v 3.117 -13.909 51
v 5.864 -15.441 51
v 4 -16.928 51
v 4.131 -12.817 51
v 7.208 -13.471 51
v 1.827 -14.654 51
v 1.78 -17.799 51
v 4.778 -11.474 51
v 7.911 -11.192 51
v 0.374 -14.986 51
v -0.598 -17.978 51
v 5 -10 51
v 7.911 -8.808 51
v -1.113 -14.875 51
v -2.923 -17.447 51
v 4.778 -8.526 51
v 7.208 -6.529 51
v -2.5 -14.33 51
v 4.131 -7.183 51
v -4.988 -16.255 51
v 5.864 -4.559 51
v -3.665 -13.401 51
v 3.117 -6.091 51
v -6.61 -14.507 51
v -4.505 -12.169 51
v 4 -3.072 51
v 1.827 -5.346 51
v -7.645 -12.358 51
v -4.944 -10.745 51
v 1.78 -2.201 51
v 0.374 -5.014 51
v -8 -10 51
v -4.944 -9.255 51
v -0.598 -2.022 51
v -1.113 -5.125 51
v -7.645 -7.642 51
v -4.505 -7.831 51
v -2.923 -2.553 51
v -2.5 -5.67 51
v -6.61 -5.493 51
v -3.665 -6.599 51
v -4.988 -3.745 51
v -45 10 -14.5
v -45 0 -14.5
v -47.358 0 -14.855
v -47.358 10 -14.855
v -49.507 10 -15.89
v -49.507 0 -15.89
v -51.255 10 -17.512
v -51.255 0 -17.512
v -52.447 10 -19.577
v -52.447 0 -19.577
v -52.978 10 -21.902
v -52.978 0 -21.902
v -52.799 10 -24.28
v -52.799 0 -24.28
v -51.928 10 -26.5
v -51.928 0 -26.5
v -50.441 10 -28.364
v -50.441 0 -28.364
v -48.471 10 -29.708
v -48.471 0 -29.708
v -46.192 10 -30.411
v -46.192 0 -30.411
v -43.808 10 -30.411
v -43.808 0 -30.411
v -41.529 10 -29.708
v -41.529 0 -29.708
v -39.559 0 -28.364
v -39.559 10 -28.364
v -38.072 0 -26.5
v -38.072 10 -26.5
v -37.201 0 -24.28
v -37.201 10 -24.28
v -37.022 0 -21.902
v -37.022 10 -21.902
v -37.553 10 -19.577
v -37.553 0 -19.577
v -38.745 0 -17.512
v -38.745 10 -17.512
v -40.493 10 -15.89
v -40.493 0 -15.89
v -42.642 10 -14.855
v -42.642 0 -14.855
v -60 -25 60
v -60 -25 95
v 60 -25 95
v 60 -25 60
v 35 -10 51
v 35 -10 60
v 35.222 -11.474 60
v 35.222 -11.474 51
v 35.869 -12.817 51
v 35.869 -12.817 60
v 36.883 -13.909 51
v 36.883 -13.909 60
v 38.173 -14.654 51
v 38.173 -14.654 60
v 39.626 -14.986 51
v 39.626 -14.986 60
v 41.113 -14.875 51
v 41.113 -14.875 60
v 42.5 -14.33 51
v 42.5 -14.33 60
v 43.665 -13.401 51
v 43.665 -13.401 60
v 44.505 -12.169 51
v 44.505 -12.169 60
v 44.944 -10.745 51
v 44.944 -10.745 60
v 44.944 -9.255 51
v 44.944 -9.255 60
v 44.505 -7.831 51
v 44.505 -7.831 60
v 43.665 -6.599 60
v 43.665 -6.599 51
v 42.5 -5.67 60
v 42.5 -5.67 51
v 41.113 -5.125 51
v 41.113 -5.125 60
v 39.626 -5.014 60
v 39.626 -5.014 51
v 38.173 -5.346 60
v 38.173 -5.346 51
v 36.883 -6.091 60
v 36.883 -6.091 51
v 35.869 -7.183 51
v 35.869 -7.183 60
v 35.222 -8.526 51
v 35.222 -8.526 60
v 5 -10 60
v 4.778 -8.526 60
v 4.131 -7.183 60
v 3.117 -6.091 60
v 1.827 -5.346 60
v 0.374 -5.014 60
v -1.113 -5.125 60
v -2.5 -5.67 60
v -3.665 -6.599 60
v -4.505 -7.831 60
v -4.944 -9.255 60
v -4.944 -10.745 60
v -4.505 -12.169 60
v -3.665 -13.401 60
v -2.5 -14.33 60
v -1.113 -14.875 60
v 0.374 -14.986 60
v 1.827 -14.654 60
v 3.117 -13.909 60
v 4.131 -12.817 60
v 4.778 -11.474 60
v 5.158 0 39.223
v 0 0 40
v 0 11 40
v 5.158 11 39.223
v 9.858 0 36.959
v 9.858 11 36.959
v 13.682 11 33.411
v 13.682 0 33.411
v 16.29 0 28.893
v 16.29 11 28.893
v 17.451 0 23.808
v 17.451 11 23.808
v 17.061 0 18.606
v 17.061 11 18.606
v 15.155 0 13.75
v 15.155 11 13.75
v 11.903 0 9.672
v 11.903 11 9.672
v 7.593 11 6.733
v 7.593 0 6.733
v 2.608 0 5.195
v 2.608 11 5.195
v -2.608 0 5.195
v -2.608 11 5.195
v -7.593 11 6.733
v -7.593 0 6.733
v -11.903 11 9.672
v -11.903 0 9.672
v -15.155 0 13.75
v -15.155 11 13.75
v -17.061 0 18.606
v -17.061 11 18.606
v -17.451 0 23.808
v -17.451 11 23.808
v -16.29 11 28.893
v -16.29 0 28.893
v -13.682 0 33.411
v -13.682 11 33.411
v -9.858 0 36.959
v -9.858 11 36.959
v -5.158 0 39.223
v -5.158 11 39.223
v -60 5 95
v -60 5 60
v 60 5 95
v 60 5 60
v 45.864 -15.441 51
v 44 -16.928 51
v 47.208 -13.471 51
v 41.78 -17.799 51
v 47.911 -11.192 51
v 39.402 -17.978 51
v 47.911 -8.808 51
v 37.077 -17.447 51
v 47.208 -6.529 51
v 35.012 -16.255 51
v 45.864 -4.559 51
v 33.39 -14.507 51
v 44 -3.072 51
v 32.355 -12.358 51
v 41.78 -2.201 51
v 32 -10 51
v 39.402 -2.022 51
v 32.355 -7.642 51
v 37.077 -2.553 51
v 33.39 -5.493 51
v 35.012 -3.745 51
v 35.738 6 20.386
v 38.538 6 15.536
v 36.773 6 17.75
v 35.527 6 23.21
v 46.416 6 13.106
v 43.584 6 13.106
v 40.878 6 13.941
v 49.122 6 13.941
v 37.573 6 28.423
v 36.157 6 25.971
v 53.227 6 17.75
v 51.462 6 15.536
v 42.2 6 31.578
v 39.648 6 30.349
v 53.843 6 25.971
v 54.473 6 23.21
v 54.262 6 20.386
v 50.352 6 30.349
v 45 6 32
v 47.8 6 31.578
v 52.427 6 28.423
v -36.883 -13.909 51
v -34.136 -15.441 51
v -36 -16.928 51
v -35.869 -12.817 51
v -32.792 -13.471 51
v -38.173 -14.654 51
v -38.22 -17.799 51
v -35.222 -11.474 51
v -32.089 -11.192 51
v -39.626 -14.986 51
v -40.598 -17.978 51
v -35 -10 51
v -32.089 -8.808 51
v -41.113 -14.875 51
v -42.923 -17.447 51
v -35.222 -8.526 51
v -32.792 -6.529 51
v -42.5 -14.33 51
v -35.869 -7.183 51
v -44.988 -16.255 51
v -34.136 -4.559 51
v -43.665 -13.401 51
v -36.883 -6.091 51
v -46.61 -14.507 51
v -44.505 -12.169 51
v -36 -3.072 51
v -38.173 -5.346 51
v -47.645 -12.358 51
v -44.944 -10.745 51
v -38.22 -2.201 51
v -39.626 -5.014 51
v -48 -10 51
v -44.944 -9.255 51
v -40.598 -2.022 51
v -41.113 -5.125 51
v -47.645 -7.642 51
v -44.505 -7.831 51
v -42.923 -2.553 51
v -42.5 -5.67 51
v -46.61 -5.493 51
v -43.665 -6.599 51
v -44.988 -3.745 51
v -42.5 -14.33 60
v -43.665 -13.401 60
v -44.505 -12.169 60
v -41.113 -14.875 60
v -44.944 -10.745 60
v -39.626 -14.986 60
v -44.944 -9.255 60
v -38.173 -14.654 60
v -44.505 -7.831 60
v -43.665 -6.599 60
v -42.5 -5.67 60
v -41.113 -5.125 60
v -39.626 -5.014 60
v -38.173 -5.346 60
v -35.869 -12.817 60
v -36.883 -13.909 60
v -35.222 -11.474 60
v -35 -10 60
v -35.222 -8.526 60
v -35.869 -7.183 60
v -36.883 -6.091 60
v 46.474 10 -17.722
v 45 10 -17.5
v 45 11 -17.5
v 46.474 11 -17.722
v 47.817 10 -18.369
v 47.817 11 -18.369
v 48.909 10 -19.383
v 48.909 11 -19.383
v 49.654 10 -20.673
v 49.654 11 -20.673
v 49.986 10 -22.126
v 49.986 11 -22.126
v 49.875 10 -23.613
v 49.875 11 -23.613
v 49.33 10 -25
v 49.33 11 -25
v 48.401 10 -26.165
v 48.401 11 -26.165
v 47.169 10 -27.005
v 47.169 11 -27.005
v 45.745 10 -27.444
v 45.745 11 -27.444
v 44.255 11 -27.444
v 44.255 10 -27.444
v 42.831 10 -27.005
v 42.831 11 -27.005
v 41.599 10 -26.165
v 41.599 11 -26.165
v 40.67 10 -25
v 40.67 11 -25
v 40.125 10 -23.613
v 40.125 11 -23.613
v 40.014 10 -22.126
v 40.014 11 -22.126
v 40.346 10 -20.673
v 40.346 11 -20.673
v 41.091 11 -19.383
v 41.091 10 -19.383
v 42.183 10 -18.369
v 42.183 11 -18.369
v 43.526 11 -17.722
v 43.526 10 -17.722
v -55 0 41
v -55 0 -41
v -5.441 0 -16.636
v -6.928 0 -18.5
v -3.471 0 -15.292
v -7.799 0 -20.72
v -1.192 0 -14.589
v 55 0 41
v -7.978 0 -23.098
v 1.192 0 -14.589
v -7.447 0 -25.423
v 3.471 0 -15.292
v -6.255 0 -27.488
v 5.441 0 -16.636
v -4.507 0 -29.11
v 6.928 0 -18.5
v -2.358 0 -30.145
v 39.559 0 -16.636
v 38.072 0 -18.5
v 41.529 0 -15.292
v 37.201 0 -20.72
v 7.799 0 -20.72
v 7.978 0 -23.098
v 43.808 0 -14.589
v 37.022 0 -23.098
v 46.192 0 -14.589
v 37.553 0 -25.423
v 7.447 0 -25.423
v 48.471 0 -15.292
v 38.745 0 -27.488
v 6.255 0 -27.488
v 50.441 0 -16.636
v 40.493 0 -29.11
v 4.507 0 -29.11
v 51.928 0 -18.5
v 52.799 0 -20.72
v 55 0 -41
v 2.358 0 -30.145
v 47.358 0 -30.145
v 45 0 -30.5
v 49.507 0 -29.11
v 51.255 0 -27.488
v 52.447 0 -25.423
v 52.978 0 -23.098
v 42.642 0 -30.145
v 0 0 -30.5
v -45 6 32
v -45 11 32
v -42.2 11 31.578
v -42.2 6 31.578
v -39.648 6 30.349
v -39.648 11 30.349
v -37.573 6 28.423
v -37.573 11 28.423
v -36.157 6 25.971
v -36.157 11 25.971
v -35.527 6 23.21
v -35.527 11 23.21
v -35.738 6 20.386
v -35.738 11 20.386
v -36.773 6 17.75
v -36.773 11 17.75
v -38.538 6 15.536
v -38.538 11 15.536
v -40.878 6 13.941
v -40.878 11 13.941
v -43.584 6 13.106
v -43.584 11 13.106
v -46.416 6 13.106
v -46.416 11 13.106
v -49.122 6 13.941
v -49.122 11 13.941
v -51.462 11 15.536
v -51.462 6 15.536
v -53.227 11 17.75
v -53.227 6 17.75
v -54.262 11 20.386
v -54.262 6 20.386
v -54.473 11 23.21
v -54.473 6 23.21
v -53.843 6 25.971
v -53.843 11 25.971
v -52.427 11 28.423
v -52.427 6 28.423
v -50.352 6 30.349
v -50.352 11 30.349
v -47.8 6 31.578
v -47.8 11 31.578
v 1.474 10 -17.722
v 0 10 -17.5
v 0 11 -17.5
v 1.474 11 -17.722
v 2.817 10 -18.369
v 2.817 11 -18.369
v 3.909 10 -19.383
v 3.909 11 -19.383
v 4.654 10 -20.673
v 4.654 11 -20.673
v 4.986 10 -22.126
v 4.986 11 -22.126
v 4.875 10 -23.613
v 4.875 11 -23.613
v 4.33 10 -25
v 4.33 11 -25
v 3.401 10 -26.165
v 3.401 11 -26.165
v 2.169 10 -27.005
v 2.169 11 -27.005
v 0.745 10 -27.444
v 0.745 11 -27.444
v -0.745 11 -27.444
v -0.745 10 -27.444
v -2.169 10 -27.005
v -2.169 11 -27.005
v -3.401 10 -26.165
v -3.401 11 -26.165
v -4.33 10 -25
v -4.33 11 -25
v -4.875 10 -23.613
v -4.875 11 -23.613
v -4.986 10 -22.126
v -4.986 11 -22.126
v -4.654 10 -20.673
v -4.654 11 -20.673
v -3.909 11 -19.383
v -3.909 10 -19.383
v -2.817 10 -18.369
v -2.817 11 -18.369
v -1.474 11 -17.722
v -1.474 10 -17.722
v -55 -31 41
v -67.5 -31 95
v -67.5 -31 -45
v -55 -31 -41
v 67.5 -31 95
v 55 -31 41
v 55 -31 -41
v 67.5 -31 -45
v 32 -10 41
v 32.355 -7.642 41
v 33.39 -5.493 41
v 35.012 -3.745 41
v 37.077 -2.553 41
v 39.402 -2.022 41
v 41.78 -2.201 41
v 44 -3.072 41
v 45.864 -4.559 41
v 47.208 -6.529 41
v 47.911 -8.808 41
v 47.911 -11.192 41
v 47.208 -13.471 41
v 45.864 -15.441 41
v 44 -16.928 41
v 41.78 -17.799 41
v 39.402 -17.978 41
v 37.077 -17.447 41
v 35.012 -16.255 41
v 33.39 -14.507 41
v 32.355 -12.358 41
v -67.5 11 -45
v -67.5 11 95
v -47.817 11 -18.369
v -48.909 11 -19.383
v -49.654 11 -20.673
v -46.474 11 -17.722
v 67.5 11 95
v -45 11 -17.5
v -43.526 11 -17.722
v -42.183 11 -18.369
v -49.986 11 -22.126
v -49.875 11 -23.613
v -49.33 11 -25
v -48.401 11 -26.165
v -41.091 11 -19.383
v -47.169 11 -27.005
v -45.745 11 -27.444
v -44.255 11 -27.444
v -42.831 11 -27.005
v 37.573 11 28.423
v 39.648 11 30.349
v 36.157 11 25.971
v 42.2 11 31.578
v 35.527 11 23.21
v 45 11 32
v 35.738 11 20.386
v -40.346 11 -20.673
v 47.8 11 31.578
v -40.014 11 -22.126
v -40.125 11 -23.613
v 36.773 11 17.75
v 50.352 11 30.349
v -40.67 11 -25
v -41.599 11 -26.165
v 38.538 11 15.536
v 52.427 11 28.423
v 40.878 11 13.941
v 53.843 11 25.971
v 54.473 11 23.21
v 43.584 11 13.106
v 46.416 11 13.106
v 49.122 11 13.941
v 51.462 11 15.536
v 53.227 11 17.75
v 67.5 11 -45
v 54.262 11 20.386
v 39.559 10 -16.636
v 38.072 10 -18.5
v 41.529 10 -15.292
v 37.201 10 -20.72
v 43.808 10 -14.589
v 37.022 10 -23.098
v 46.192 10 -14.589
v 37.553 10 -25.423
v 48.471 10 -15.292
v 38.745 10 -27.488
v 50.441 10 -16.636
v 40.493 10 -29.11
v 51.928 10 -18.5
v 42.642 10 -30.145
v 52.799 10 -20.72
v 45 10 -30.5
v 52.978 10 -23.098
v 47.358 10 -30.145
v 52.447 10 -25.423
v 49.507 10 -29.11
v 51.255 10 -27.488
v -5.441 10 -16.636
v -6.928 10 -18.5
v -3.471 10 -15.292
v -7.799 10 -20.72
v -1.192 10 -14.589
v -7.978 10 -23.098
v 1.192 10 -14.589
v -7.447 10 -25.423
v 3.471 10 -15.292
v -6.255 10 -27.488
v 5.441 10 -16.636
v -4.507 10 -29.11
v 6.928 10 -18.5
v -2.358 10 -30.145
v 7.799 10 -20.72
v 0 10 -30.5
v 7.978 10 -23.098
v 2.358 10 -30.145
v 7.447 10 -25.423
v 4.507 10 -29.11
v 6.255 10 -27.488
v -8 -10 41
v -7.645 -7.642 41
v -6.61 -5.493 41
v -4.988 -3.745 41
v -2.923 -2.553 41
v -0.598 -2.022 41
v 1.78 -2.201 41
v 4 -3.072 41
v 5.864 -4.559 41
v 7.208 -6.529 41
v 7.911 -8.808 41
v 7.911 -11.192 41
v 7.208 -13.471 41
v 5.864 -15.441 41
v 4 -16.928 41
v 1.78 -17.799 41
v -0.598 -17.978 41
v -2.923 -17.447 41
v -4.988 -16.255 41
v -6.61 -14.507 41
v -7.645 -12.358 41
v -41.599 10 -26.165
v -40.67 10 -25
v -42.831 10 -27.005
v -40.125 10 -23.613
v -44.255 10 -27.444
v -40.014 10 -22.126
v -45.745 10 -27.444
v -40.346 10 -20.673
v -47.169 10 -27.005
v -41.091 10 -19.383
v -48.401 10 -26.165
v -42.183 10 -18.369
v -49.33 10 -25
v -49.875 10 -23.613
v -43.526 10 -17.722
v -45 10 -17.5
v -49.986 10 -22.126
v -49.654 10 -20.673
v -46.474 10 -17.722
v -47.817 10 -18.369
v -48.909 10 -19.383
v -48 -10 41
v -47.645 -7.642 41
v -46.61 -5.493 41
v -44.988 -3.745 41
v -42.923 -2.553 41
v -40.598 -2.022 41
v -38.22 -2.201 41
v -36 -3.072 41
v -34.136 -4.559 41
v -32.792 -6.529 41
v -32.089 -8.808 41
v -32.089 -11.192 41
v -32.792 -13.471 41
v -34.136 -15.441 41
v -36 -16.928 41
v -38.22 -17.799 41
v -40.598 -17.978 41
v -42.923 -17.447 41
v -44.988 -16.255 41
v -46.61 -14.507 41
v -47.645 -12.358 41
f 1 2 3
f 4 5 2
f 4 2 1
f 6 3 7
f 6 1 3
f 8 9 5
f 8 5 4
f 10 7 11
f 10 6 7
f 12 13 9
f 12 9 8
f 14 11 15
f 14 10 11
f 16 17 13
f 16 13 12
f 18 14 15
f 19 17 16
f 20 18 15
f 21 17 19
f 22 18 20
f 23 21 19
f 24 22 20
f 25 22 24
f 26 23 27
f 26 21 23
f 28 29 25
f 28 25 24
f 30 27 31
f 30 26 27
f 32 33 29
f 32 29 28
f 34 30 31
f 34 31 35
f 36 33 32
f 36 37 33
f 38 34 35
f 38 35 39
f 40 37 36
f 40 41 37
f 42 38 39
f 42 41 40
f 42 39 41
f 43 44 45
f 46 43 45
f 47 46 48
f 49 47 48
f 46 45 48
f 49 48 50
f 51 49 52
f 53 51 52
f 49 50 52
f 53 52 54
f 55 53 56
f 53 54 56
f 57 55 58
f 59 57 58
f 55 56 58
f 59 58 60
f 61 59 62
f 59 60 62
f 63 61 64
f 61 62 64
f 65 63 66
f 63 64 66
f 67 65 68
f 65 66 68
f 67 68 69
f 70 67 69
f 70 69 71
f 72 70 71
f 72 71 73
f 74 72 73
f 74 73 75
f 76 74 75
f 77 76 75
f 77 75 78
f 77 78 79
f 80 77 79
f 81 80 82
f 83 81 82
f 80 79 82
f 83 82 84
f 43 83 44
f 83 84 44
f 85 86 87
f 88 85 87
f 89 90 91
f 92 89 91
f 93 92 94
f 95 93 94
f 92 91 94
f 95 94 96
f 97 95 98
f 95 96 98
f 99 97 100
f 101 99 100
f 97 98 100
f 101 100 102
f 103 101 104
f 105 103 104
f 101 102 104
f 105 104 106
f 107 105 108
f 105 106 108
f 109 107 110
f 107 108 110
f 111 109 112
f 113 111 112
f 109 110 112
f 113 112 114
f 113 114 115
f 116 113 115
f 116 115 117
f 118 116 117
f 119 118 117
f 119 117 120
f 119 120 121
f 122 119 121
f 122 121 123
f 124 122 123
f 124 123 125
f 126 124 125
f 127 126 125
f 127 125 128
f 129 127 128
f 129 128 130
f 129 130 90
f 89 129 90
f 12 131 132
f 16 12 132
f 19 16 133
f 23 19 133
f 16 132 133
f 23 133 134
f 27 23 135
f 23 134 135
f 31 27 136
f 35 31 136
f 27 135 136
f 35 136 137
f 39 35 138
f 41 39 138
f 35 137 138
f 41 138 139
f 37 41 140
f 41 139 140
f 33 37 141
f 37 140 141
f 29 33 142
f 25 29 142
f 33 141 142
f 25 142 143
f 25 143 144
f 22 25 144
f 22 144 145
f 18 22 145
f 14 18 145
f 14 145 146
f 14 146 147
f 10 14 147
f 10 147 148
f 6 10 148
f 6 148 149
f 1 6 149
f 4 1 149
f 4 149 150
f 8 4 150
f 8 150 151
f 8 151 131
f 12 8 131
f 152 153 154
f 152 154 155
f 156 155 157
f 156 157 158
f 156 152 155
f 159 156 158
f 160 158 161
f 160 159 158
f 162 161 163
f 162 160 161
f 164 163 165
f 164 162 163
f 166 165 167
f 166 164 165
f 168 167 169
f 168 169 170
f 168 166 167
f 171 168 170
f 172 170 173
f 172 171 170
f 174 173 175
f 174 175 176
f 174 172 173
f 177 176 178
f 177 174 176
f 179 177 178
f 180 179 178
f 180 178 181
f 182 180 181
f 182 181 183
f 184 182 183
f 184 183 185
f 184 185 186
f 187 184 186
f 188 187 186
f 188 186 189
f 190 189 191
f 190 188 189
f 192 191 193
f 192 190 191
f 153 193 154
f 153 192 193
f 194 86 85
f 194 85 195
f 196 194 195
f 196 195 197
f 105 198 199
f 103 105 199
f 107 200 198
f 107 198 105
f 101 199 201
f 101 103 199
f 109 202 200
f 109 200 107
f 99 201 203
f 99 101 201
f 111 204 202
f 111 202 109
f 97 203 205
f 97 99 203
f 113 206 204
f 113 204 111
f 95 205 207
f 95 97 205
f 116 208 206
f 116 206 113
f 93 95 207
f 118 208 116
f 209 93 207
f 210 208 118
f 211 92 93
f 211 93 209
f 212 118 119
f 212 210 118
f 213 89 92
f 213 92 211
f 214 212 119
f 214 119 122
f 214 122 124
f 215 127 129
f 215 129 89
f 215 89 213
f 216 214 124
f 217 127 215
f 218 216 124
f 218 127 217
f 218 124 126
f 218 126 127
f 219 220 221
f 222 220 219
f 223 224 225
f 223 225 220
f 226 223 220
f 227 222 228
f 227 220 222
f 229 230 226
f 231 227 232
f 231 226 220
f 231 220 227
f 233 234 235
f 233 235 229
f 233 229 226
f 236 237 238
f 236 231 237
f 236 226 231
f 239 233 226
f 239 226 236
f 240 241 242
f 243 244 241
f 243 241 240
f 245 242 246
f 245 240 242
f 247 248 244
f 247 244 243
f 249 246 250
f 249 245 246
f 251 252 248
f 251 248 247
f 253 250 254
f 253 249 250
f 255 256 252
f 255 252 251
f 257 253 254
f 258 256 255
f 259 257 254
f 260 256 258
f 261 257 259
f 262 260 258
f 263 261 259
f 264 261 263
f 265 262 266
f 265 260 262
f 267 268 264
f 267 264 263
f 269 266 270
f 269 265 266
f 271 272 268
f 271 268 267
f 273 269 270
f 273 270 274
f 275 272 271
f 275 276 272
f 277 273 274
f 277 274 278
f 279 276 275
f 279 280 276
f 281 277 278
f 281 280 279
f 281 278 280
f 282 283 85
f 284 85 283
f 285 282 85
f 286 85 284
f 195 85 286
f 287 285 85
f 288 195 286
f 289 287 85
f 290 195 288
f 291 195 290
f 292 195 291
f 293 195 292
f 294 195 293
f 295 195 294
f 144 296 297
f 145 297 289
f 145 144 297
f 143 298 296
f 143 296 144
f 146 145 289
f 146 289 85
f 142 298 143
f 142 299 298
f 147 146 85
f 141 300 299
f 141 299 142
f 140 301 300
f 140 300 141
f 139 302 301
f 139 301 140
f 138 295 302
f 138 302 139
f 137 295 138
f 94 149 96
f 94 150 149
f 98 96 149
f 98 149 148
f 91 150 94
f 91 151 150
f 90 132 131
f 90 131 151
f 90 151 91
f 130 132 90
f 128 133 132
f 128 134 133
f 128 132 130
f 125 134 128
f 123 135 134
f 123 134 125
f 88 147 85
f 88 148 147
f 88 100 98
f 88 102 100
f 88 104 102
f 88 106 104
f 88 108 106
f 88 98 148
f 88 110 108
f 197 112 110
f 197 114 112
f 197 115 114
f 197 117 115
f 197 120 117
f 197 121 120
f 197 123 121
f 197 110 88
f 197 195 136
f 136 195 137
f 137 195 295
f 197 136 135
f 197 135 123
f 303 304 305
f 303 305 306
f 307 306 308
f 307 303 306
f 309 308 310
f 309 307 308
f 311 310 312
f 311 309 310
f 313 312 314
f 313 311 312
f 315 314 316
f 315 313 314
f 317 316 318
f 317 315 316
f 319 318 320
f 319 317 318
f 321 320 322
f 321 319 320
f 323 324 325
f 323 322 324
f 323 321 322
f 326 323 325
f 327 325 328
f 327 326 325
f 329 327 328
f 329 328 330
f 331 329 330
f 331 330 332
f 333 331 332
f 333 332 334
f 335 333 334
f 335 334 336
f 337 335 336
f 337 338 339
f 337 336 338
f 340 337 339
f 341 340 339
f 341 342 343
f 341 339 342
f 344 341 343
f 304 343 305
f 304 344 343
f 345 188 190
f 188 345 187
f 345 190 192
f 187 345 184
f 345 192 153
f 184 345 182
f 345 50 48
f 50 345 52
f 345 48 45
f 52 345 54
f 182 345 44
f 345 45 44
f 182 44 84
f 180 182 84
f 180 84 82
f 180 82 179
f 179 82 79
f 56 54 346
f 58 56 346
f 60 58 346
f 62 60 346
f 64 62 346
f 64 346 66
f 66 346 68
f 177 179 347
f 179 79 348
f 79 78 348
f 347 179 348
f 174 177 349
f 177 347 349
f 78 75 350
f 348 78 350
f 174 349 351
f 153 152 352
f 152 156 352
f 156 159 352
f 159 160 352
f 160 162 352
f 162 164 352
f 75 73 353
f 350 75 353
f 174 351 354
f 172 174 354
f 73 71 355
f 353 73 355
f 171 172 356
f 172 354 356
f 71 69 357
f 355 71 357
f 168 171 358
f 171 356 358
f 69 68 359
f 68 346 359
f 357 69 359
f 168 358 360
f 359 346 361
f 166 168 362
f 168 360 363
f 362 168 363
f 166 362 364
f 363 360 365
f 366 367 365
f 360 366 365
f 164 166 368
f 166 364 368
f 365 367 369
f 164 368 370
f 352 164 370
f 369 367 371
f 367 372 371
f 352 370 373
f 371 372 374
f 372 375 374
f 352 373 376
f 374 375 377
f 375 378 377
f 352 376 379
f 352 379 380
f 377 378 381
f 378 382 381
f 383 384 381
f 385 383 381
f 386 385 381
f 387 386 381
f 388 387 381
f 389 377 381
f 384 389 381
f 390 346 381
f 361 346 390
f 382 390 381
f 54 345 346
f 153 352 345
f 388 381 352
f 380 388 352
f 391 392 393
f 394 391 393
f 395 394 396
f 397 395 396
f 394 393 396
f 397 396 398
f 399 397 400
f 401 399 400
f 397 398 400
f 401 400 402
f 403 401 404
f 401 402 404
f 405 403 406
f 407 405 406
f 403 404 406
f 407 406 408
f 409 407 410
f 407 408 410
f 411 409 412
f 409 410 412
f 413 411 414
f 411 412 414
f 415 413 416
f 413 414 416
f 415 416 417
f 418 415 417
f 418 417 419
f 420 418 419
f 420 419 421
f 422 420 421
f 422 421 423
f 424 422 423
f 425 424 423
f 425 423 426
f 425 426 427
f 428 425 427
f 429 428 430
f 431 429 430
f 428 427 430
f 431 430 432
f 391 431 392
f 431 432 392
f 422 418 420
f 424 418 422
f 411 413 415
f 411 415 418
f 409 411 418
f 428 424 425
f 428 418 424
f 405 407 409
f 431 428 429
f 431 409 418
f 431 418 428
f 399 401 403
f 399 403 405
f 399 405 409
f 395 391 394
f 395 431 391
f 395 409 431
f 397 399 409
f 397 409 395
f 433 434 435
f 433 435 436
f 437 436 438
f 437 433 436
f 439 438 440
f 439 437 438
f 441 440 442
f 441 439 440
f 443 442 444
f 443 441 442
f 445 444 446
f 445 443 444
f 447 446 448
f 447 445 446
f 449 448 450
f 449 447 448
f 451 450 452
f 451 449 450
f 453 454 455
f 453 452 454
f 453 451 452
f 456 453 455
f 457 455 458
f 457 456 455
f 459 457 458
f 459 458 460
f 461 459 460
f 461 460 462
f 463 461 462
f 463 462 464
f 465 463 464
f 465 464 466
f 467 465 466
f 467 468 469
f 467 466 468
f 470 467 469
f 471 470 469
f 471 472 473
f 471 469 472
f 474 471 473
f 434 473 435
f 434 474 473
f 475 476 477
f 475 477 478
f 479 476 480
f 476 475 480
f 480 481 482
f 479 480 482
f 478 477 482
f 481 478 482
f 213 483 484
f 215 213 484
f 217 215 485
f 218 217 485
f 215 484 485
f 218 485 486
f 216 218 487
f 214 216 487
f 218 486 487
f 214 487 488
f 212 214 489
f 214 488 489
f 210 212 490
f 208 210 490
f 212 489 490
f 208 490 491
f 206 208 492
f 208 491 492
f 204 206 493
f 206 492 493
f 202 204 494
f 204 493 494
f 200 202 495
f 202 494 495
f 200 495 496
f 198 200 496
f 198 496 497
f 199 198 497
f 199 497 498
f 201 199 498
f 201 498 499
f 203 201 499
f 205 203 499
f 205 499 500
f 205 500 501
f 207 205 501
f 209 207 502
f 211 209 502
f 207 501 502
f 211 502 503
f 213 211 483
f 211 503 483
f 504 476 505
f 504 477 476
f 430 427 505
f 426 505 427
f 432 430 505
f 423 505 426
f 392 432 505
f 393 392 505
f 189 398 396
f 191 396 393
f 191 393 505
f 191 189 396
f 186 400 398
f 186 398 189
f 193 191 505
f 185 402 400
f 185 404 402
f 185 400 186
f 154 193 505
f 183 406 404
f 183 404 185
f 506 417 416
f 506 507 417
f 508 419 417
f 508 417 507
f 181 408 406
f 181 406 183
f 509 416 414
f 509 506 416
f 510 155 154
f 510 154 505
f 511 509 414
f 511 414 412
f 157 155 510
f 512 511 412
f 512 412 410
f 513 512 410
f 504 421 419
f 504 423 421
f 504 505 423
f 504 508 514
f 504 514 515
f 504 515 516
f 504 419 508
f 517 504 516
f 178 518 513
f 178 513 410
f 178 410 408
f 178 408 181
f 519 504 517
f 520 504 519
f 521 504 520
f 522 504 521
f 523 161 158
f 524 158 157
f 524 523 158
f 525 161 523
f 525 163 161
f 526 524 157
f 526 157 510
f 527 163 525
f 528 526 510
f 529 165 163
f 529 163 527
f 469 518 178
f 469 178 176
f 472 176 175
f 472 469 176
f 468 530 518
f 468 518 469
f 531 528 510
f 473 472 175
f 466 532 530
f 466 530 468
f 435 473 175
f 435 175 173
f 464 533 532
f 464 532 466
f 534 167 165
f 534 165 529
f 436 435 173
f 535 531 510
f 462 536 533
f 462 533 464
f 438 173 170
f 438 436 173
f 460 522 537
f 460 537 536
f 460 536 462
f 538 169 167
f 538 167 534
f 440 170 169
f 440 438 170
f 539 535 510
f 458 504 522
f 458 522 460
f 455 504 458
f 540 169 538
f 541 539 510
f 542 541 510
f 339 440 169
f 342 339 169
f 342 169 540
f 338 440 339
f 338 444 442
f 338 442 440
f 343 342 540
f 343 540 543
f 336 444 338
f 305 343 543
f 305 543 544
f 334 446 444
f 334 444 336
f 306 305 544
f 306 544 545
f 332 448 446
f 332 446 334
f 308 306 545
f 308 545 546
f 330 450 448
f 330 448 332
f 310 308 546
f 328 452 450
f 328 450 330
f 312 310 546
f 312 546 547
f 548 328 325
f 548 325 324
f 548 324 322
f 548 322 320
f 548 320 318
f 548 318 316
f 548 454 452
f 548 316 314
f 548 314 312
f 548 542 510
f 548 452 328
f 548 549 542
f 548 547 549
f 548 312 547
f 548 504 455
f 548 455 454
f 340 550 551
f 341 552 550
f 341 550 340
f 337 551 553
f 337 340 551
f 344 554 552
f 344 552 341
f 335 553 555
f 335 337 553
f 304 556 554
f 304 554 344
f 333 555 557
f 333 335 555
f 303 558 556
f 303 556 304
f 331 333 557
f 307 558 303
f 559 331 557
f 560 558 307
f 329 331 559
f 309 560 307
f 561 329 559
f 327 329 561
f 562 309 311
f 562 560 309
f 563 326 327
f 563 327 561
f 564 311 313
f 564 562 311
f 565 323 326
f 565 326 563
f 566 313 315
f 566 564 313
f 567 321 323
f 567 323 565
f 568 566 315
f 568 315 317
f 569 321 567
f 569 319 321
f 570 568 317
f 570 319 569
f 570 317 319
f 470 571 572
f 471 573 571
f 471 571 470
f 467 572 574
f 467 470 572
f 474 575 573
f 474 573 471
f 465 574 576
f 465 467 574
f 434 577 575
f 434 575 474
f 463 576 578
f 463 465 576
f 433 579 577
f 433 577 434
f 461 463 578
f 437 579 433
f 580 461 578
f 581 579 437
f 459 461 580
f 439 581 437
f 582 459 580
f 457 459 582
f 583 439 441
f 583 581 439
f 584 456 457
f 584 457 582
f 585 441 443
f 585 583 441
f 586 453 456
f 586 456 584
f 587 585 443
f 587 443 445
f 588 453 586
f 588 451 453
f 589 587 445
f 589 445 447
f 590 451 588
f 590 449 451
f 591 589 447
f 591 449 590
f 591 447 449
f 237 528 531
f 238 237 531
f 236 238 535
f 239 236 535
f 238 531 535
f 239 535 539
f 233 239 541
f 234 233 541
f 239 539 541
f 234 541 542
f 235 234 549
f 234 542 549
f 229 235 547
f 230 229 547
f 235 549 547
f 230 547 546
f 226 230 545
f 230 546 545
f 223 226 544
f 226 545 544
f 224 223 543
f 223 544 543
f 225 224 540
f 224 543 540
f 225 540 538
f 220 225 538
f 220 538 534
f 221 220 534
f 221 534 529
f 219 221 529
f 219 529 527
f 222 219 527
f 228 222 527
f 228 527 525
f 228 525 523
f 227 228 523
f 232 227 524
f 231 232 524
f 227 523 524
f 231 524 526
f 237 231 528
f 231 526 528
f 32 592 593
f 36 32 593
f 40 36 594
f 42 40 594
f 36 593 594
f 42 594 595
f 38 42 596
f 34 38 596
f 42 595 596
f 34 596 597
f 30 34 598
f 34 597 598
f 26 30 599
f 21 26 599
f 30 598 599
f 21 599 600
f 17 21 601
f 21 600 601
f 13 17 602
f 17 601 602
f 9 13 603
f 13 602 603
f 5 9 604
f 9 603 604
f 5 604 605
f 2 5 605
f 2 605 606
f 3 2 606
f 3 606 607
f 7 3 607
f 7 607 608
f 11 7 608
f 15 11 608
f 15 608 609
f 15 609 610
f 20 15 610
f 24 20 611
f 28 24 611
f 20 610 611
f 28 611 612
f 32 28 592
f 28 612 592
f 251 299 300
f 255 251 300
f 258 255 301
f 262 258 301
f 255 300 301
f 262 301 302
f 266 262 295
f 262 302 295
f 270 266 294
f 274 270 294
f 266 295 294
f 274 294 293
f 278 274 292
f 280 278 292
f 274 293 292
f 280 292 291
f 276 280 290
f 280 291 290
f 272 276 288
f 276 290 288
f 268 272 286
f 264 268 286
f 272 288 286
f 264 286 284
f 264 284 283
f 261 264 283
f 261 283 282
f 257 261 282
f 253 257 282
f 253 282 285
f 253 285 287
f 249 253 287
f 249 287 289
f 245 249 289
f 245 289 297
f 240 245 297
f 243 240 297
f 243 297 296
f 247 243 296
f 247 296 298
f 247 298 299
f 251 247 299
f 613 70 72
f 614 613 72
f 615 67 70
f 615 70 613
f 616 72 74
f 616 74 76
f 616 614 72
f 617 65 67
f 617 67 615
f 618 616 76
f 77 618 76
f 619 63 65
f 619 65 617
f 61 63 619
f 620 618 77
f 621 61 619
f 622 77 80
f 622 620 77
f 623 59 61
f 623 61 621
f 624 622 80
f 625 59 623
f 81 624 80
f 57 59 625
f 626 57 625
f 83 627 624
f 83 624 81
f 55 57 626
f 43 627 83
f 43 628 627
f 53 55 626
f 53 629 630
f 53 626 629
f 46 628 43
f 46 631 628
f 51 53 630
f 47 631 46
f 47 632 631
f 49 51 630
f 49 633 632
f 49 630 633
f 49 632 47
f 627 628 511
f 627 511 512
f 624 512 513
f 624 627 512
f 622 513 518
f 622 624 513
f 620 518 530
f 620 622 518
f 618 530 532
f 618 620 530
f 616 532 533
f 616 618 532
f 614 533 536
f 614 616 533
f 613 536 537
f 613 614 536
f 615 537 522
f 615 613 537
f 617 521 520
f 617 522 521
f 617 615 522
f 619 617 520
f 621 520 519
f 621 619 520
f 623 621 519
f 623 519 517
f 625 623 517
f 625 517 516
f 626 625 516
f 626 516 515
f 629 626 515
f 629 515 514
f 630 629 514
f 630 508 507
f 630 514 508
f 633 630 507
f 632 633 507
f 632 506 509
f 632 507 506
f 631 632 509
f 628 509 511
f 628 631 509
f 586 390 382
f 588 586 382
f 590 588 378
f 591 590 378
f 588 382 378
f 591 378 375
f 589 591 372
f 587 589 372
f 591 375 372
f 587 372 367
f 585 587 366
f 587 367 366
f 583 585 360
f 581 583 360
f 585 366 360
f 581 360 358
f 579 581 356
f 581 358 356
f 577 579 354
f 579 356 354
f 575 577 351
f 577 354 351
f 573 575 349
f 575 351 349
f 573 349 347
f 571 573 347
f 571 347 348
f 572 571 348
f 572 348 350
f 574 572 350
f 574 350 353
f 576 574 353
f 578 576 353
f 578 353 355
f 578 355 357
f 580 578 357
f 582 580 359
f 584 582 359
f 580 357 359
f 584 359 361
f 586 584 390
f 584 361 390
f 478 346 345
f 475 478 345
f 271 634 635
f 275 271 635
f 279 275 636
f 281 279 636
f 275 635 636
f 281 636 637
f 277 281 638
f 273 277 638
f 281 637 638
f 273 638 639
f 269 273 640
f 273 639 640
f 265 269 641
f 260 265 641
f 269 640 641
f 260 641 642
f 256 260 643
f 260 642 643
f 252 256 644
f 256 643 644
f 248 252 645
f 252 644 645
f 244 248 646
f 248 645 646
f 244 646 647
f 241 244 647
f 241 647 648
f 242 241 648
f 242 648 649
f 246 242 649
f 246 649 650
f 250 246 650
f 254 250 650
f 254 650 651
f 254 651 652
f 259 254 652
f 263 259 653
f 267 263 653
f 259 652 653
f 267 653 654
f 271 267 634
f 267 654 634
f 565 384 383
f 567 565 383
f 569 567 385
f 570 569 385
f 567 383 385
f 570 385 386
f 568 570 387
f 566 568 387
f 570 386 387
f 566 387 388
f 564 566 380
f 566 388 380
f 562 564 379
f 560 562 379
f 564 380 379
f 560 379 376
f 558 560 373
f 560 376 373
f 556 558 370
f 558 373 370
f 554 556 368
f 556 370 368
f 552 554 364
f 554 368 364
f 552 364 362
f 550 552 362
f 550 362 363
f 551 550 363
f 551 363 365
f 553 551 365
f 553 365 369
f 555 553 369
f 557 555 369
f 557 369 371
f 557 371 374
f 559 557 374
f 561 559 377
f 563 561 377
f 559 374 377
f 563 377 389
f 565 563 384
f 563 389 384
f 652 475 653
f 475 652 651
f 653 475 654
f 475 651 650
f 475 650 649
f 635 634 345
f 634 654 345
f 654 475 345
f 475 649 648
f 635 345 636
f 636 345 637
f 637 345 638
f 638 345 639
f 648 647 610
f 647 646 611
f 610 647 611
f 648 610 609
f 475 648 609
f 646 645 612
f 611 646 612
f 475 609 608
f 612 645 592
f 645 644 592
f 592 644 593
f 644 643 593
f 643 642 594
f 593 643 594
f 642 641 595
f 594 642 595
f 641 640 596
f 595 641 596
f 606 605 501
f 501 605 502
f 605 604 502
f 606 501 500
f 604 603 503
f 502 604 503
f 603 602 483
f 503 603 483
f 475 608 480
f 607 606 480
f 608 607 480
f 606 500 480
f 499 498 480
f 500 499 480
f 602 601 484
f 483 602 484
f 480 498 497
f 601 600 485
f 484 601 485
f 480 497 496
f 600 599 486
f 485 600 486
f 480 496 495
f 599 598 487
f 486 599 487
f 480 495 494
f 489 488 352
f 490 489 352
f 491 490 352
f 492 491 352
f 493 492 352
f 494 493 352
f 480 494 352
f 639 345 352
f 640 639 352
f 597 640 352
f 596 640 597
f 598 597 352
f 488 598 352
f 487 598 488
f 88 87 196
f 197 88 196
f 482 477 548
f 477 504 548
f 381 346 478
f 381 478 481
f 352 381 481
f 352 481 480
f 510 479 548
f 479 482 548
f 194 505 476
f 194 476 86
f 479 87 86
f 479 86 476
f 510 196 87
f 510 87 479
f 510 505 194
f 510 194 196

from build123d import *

# Parameters (mm, degrees)
SKETCH1_W               = 135
SKETCH1_H               = 90
SKETCH1_R               = 17.5
BOSS_EXTRUDE1_DEPTH     = 11
SKETCH3_R               = 9.5
CUT_EXTRUDE1_DEPTH      = 5
CUT_EXTRUDE2_DEPTH      = 82.867270628
CUT_EXTRUDE2_DEPTH_BACK = 82.867270628
SKETCH5_R               = 5
SKETCH6_R               = 8
CUT_EXTRUDE3_DEPTH      = 10
SKETCH7_W               = 135
SKETCH7_H               = 90
SKETCH7_W_2             = 110
SKETCH7_H_2             = 82
BOSS_EXTRUDE2_DEPTH     = 31
SKETCH8_W               = 135
SKETCH8_H               = 42
BOSS_EXTRUDE3_DEPTH     = 50
SKETCH9_W               = 120
SKETCH9_H               = 30
CUT_EXTRUDE4_DEPTH      = 35
SKETCH10_R              = 5
CUT_EXTRUDE5_DEPTH      = 101
SKETCH11_R              = 8
CUT_EXTRUDE6_DEPTH      = 10


with BuildPart() as part:
    # Sketch1 → Boss-Extrude1 (new body)
    with BuildSketch(Plane(origin=(0, 0, 0), x_dir=(1, 0, 0), z_dir=(0, 1, 0))):
        Rectangle(SKETCH1_W, SKETCH1_H)
        with Locations(Location((0, -22.5, 0), (0, 0, 270))):
            Circle(SKETCH1_R, mode=Mode.SUBTRACT)
    extrude(amount=BOSS_EXTRUDE1_DEPTH)

    # Sketch3 → Cut-Extrude1 (cut)
    with BuildSketch(Plane(origin=(0, 11, 0), x_dir=(1, 0, 0), z_dir=(0, 1, 0))):
        with Locations(Location((45, -22.5, 0), (0, 0, 270))):
            Circle(SKETCH3_R)
        with Locations(Location((-45, -22.5, 0), (0, 0, 270))):
            Circle(SKETCH3_R)
    extrude(amount=-CUT_EXTRUDE1_DEPTH, mode=Mode.SUBTRACT)

    # Sketch5 → Cut-Extrude2 (cut, two sides: drawn at the far end of the back side and taken through both)
    with BuildSketch(Plane(origin=(0, 11, 0), x_dir=(1, 0, 0), z_dir=(0, 1, 0)).offset(-CUT_EXTRUDE2_DEPTH_BACK)):
        with Locations(Location((0, 22.5, 0), (0, 0, 270))):
            Circle(SKETCH5_R)
        with Locations(Location((45, 22.5, 0), (0, 0, 270))):
            Circle(SKETCH5_R)
        with Locations(Location((-45, 22.5, 0), (0, 0, 270))):
            Circle(SKETCH5_R)
    extrude(amount=CUT_EXTRUDE2_DEPTH + CUT_EXTRUDE2_DEPTH_BACK, mode=Mode.SUBTRACT)

    # Sketch6 → Cut-Extrude3 (cut)
    with BuildSketch(Plane.XZ):
        with Locations(Location((45, -22.5, 0), (0, 0, 270))):
            Circle(SKETCH6_R)
        with Locations(Location((0, -22.5, 0), (0, 0, 270))):
            Circle(SKETCH6_R)
        with Locations(Location((-45, -22.5, 0), (0, 0, 90))):
            Circle(SKETCH6_R)
    extrude(amount=-CUT_EXTRUDE3_DEPTH, mode=Mode.SUBTRACT)

    # Sketch7 → Boss-Extrude2 (add)
    with BuildSketch(Plane.XZ):
        Rectangle(SKETCH7_W, SKETCH7_H)
        Rectangle(SKETCH7_W_2, SKETCH7_H_2, mode=Mode.SUBTRACT)
    extrude(amount=BOSS_EXTRUDE2_DEPTH)

    # Sketch8 → Boss-Extrude3 (add)
    with BuildSketch(Plane.XY.offset(45)):
        with Locations((0, -10)):
            Rectangle(SKETCH8_W, SKETCH8_H)
    extrude(amount=BOSS_EXTRUDE3_DEPTH)

    # Sketch9 → Cut-Extrude4 (cut)
    with BuildSketch(Plane.XY.offset(95)):
        with Locations((0, -10)):
            Rectangle(SKETCH9_W, SKETCH9_H)
    extrude(amount=-CUT_EXTRUDE4_DEPTH, mode=Mode.SUBTRACT)

    # Sketch10 → Cut-Extrude5 (cut)
    with BuildSketch(Plane.XY.offset(60)):
        with Locations((-40, -10)):
            Circle(SKETCH10_R)
        with Locations(Location((40, -10, 0), (0, 0, 180))):
            Circle(SKETCH10_R)
        with Locations((0, -10)):
            Circle(SKETCH10_R)
    extrude(amount=-CUT_EXTRUDE5_DEPTH, mode=Mode.SUBTRACT)

    # Sketch11 → Cut-Extrude6 (cut)
    with BuildSketch(Plane(origin=(0, 0, 41), x_dir=(-1, 0, 0), z_dir=(0, 0, -1))):
        with Locations((0, -10)):
            Circle(SKETCH11_R)
        with Locations((-40, -10)):
            Circle(SKETCH11_R)
        with Locations((40, -10)):
            Circle(SKETCH11_R)
    extrude(amount=-CUT_EXTRUDE6_DEPTH, mode=Mode.SUBTRACT)


solid = part.part
